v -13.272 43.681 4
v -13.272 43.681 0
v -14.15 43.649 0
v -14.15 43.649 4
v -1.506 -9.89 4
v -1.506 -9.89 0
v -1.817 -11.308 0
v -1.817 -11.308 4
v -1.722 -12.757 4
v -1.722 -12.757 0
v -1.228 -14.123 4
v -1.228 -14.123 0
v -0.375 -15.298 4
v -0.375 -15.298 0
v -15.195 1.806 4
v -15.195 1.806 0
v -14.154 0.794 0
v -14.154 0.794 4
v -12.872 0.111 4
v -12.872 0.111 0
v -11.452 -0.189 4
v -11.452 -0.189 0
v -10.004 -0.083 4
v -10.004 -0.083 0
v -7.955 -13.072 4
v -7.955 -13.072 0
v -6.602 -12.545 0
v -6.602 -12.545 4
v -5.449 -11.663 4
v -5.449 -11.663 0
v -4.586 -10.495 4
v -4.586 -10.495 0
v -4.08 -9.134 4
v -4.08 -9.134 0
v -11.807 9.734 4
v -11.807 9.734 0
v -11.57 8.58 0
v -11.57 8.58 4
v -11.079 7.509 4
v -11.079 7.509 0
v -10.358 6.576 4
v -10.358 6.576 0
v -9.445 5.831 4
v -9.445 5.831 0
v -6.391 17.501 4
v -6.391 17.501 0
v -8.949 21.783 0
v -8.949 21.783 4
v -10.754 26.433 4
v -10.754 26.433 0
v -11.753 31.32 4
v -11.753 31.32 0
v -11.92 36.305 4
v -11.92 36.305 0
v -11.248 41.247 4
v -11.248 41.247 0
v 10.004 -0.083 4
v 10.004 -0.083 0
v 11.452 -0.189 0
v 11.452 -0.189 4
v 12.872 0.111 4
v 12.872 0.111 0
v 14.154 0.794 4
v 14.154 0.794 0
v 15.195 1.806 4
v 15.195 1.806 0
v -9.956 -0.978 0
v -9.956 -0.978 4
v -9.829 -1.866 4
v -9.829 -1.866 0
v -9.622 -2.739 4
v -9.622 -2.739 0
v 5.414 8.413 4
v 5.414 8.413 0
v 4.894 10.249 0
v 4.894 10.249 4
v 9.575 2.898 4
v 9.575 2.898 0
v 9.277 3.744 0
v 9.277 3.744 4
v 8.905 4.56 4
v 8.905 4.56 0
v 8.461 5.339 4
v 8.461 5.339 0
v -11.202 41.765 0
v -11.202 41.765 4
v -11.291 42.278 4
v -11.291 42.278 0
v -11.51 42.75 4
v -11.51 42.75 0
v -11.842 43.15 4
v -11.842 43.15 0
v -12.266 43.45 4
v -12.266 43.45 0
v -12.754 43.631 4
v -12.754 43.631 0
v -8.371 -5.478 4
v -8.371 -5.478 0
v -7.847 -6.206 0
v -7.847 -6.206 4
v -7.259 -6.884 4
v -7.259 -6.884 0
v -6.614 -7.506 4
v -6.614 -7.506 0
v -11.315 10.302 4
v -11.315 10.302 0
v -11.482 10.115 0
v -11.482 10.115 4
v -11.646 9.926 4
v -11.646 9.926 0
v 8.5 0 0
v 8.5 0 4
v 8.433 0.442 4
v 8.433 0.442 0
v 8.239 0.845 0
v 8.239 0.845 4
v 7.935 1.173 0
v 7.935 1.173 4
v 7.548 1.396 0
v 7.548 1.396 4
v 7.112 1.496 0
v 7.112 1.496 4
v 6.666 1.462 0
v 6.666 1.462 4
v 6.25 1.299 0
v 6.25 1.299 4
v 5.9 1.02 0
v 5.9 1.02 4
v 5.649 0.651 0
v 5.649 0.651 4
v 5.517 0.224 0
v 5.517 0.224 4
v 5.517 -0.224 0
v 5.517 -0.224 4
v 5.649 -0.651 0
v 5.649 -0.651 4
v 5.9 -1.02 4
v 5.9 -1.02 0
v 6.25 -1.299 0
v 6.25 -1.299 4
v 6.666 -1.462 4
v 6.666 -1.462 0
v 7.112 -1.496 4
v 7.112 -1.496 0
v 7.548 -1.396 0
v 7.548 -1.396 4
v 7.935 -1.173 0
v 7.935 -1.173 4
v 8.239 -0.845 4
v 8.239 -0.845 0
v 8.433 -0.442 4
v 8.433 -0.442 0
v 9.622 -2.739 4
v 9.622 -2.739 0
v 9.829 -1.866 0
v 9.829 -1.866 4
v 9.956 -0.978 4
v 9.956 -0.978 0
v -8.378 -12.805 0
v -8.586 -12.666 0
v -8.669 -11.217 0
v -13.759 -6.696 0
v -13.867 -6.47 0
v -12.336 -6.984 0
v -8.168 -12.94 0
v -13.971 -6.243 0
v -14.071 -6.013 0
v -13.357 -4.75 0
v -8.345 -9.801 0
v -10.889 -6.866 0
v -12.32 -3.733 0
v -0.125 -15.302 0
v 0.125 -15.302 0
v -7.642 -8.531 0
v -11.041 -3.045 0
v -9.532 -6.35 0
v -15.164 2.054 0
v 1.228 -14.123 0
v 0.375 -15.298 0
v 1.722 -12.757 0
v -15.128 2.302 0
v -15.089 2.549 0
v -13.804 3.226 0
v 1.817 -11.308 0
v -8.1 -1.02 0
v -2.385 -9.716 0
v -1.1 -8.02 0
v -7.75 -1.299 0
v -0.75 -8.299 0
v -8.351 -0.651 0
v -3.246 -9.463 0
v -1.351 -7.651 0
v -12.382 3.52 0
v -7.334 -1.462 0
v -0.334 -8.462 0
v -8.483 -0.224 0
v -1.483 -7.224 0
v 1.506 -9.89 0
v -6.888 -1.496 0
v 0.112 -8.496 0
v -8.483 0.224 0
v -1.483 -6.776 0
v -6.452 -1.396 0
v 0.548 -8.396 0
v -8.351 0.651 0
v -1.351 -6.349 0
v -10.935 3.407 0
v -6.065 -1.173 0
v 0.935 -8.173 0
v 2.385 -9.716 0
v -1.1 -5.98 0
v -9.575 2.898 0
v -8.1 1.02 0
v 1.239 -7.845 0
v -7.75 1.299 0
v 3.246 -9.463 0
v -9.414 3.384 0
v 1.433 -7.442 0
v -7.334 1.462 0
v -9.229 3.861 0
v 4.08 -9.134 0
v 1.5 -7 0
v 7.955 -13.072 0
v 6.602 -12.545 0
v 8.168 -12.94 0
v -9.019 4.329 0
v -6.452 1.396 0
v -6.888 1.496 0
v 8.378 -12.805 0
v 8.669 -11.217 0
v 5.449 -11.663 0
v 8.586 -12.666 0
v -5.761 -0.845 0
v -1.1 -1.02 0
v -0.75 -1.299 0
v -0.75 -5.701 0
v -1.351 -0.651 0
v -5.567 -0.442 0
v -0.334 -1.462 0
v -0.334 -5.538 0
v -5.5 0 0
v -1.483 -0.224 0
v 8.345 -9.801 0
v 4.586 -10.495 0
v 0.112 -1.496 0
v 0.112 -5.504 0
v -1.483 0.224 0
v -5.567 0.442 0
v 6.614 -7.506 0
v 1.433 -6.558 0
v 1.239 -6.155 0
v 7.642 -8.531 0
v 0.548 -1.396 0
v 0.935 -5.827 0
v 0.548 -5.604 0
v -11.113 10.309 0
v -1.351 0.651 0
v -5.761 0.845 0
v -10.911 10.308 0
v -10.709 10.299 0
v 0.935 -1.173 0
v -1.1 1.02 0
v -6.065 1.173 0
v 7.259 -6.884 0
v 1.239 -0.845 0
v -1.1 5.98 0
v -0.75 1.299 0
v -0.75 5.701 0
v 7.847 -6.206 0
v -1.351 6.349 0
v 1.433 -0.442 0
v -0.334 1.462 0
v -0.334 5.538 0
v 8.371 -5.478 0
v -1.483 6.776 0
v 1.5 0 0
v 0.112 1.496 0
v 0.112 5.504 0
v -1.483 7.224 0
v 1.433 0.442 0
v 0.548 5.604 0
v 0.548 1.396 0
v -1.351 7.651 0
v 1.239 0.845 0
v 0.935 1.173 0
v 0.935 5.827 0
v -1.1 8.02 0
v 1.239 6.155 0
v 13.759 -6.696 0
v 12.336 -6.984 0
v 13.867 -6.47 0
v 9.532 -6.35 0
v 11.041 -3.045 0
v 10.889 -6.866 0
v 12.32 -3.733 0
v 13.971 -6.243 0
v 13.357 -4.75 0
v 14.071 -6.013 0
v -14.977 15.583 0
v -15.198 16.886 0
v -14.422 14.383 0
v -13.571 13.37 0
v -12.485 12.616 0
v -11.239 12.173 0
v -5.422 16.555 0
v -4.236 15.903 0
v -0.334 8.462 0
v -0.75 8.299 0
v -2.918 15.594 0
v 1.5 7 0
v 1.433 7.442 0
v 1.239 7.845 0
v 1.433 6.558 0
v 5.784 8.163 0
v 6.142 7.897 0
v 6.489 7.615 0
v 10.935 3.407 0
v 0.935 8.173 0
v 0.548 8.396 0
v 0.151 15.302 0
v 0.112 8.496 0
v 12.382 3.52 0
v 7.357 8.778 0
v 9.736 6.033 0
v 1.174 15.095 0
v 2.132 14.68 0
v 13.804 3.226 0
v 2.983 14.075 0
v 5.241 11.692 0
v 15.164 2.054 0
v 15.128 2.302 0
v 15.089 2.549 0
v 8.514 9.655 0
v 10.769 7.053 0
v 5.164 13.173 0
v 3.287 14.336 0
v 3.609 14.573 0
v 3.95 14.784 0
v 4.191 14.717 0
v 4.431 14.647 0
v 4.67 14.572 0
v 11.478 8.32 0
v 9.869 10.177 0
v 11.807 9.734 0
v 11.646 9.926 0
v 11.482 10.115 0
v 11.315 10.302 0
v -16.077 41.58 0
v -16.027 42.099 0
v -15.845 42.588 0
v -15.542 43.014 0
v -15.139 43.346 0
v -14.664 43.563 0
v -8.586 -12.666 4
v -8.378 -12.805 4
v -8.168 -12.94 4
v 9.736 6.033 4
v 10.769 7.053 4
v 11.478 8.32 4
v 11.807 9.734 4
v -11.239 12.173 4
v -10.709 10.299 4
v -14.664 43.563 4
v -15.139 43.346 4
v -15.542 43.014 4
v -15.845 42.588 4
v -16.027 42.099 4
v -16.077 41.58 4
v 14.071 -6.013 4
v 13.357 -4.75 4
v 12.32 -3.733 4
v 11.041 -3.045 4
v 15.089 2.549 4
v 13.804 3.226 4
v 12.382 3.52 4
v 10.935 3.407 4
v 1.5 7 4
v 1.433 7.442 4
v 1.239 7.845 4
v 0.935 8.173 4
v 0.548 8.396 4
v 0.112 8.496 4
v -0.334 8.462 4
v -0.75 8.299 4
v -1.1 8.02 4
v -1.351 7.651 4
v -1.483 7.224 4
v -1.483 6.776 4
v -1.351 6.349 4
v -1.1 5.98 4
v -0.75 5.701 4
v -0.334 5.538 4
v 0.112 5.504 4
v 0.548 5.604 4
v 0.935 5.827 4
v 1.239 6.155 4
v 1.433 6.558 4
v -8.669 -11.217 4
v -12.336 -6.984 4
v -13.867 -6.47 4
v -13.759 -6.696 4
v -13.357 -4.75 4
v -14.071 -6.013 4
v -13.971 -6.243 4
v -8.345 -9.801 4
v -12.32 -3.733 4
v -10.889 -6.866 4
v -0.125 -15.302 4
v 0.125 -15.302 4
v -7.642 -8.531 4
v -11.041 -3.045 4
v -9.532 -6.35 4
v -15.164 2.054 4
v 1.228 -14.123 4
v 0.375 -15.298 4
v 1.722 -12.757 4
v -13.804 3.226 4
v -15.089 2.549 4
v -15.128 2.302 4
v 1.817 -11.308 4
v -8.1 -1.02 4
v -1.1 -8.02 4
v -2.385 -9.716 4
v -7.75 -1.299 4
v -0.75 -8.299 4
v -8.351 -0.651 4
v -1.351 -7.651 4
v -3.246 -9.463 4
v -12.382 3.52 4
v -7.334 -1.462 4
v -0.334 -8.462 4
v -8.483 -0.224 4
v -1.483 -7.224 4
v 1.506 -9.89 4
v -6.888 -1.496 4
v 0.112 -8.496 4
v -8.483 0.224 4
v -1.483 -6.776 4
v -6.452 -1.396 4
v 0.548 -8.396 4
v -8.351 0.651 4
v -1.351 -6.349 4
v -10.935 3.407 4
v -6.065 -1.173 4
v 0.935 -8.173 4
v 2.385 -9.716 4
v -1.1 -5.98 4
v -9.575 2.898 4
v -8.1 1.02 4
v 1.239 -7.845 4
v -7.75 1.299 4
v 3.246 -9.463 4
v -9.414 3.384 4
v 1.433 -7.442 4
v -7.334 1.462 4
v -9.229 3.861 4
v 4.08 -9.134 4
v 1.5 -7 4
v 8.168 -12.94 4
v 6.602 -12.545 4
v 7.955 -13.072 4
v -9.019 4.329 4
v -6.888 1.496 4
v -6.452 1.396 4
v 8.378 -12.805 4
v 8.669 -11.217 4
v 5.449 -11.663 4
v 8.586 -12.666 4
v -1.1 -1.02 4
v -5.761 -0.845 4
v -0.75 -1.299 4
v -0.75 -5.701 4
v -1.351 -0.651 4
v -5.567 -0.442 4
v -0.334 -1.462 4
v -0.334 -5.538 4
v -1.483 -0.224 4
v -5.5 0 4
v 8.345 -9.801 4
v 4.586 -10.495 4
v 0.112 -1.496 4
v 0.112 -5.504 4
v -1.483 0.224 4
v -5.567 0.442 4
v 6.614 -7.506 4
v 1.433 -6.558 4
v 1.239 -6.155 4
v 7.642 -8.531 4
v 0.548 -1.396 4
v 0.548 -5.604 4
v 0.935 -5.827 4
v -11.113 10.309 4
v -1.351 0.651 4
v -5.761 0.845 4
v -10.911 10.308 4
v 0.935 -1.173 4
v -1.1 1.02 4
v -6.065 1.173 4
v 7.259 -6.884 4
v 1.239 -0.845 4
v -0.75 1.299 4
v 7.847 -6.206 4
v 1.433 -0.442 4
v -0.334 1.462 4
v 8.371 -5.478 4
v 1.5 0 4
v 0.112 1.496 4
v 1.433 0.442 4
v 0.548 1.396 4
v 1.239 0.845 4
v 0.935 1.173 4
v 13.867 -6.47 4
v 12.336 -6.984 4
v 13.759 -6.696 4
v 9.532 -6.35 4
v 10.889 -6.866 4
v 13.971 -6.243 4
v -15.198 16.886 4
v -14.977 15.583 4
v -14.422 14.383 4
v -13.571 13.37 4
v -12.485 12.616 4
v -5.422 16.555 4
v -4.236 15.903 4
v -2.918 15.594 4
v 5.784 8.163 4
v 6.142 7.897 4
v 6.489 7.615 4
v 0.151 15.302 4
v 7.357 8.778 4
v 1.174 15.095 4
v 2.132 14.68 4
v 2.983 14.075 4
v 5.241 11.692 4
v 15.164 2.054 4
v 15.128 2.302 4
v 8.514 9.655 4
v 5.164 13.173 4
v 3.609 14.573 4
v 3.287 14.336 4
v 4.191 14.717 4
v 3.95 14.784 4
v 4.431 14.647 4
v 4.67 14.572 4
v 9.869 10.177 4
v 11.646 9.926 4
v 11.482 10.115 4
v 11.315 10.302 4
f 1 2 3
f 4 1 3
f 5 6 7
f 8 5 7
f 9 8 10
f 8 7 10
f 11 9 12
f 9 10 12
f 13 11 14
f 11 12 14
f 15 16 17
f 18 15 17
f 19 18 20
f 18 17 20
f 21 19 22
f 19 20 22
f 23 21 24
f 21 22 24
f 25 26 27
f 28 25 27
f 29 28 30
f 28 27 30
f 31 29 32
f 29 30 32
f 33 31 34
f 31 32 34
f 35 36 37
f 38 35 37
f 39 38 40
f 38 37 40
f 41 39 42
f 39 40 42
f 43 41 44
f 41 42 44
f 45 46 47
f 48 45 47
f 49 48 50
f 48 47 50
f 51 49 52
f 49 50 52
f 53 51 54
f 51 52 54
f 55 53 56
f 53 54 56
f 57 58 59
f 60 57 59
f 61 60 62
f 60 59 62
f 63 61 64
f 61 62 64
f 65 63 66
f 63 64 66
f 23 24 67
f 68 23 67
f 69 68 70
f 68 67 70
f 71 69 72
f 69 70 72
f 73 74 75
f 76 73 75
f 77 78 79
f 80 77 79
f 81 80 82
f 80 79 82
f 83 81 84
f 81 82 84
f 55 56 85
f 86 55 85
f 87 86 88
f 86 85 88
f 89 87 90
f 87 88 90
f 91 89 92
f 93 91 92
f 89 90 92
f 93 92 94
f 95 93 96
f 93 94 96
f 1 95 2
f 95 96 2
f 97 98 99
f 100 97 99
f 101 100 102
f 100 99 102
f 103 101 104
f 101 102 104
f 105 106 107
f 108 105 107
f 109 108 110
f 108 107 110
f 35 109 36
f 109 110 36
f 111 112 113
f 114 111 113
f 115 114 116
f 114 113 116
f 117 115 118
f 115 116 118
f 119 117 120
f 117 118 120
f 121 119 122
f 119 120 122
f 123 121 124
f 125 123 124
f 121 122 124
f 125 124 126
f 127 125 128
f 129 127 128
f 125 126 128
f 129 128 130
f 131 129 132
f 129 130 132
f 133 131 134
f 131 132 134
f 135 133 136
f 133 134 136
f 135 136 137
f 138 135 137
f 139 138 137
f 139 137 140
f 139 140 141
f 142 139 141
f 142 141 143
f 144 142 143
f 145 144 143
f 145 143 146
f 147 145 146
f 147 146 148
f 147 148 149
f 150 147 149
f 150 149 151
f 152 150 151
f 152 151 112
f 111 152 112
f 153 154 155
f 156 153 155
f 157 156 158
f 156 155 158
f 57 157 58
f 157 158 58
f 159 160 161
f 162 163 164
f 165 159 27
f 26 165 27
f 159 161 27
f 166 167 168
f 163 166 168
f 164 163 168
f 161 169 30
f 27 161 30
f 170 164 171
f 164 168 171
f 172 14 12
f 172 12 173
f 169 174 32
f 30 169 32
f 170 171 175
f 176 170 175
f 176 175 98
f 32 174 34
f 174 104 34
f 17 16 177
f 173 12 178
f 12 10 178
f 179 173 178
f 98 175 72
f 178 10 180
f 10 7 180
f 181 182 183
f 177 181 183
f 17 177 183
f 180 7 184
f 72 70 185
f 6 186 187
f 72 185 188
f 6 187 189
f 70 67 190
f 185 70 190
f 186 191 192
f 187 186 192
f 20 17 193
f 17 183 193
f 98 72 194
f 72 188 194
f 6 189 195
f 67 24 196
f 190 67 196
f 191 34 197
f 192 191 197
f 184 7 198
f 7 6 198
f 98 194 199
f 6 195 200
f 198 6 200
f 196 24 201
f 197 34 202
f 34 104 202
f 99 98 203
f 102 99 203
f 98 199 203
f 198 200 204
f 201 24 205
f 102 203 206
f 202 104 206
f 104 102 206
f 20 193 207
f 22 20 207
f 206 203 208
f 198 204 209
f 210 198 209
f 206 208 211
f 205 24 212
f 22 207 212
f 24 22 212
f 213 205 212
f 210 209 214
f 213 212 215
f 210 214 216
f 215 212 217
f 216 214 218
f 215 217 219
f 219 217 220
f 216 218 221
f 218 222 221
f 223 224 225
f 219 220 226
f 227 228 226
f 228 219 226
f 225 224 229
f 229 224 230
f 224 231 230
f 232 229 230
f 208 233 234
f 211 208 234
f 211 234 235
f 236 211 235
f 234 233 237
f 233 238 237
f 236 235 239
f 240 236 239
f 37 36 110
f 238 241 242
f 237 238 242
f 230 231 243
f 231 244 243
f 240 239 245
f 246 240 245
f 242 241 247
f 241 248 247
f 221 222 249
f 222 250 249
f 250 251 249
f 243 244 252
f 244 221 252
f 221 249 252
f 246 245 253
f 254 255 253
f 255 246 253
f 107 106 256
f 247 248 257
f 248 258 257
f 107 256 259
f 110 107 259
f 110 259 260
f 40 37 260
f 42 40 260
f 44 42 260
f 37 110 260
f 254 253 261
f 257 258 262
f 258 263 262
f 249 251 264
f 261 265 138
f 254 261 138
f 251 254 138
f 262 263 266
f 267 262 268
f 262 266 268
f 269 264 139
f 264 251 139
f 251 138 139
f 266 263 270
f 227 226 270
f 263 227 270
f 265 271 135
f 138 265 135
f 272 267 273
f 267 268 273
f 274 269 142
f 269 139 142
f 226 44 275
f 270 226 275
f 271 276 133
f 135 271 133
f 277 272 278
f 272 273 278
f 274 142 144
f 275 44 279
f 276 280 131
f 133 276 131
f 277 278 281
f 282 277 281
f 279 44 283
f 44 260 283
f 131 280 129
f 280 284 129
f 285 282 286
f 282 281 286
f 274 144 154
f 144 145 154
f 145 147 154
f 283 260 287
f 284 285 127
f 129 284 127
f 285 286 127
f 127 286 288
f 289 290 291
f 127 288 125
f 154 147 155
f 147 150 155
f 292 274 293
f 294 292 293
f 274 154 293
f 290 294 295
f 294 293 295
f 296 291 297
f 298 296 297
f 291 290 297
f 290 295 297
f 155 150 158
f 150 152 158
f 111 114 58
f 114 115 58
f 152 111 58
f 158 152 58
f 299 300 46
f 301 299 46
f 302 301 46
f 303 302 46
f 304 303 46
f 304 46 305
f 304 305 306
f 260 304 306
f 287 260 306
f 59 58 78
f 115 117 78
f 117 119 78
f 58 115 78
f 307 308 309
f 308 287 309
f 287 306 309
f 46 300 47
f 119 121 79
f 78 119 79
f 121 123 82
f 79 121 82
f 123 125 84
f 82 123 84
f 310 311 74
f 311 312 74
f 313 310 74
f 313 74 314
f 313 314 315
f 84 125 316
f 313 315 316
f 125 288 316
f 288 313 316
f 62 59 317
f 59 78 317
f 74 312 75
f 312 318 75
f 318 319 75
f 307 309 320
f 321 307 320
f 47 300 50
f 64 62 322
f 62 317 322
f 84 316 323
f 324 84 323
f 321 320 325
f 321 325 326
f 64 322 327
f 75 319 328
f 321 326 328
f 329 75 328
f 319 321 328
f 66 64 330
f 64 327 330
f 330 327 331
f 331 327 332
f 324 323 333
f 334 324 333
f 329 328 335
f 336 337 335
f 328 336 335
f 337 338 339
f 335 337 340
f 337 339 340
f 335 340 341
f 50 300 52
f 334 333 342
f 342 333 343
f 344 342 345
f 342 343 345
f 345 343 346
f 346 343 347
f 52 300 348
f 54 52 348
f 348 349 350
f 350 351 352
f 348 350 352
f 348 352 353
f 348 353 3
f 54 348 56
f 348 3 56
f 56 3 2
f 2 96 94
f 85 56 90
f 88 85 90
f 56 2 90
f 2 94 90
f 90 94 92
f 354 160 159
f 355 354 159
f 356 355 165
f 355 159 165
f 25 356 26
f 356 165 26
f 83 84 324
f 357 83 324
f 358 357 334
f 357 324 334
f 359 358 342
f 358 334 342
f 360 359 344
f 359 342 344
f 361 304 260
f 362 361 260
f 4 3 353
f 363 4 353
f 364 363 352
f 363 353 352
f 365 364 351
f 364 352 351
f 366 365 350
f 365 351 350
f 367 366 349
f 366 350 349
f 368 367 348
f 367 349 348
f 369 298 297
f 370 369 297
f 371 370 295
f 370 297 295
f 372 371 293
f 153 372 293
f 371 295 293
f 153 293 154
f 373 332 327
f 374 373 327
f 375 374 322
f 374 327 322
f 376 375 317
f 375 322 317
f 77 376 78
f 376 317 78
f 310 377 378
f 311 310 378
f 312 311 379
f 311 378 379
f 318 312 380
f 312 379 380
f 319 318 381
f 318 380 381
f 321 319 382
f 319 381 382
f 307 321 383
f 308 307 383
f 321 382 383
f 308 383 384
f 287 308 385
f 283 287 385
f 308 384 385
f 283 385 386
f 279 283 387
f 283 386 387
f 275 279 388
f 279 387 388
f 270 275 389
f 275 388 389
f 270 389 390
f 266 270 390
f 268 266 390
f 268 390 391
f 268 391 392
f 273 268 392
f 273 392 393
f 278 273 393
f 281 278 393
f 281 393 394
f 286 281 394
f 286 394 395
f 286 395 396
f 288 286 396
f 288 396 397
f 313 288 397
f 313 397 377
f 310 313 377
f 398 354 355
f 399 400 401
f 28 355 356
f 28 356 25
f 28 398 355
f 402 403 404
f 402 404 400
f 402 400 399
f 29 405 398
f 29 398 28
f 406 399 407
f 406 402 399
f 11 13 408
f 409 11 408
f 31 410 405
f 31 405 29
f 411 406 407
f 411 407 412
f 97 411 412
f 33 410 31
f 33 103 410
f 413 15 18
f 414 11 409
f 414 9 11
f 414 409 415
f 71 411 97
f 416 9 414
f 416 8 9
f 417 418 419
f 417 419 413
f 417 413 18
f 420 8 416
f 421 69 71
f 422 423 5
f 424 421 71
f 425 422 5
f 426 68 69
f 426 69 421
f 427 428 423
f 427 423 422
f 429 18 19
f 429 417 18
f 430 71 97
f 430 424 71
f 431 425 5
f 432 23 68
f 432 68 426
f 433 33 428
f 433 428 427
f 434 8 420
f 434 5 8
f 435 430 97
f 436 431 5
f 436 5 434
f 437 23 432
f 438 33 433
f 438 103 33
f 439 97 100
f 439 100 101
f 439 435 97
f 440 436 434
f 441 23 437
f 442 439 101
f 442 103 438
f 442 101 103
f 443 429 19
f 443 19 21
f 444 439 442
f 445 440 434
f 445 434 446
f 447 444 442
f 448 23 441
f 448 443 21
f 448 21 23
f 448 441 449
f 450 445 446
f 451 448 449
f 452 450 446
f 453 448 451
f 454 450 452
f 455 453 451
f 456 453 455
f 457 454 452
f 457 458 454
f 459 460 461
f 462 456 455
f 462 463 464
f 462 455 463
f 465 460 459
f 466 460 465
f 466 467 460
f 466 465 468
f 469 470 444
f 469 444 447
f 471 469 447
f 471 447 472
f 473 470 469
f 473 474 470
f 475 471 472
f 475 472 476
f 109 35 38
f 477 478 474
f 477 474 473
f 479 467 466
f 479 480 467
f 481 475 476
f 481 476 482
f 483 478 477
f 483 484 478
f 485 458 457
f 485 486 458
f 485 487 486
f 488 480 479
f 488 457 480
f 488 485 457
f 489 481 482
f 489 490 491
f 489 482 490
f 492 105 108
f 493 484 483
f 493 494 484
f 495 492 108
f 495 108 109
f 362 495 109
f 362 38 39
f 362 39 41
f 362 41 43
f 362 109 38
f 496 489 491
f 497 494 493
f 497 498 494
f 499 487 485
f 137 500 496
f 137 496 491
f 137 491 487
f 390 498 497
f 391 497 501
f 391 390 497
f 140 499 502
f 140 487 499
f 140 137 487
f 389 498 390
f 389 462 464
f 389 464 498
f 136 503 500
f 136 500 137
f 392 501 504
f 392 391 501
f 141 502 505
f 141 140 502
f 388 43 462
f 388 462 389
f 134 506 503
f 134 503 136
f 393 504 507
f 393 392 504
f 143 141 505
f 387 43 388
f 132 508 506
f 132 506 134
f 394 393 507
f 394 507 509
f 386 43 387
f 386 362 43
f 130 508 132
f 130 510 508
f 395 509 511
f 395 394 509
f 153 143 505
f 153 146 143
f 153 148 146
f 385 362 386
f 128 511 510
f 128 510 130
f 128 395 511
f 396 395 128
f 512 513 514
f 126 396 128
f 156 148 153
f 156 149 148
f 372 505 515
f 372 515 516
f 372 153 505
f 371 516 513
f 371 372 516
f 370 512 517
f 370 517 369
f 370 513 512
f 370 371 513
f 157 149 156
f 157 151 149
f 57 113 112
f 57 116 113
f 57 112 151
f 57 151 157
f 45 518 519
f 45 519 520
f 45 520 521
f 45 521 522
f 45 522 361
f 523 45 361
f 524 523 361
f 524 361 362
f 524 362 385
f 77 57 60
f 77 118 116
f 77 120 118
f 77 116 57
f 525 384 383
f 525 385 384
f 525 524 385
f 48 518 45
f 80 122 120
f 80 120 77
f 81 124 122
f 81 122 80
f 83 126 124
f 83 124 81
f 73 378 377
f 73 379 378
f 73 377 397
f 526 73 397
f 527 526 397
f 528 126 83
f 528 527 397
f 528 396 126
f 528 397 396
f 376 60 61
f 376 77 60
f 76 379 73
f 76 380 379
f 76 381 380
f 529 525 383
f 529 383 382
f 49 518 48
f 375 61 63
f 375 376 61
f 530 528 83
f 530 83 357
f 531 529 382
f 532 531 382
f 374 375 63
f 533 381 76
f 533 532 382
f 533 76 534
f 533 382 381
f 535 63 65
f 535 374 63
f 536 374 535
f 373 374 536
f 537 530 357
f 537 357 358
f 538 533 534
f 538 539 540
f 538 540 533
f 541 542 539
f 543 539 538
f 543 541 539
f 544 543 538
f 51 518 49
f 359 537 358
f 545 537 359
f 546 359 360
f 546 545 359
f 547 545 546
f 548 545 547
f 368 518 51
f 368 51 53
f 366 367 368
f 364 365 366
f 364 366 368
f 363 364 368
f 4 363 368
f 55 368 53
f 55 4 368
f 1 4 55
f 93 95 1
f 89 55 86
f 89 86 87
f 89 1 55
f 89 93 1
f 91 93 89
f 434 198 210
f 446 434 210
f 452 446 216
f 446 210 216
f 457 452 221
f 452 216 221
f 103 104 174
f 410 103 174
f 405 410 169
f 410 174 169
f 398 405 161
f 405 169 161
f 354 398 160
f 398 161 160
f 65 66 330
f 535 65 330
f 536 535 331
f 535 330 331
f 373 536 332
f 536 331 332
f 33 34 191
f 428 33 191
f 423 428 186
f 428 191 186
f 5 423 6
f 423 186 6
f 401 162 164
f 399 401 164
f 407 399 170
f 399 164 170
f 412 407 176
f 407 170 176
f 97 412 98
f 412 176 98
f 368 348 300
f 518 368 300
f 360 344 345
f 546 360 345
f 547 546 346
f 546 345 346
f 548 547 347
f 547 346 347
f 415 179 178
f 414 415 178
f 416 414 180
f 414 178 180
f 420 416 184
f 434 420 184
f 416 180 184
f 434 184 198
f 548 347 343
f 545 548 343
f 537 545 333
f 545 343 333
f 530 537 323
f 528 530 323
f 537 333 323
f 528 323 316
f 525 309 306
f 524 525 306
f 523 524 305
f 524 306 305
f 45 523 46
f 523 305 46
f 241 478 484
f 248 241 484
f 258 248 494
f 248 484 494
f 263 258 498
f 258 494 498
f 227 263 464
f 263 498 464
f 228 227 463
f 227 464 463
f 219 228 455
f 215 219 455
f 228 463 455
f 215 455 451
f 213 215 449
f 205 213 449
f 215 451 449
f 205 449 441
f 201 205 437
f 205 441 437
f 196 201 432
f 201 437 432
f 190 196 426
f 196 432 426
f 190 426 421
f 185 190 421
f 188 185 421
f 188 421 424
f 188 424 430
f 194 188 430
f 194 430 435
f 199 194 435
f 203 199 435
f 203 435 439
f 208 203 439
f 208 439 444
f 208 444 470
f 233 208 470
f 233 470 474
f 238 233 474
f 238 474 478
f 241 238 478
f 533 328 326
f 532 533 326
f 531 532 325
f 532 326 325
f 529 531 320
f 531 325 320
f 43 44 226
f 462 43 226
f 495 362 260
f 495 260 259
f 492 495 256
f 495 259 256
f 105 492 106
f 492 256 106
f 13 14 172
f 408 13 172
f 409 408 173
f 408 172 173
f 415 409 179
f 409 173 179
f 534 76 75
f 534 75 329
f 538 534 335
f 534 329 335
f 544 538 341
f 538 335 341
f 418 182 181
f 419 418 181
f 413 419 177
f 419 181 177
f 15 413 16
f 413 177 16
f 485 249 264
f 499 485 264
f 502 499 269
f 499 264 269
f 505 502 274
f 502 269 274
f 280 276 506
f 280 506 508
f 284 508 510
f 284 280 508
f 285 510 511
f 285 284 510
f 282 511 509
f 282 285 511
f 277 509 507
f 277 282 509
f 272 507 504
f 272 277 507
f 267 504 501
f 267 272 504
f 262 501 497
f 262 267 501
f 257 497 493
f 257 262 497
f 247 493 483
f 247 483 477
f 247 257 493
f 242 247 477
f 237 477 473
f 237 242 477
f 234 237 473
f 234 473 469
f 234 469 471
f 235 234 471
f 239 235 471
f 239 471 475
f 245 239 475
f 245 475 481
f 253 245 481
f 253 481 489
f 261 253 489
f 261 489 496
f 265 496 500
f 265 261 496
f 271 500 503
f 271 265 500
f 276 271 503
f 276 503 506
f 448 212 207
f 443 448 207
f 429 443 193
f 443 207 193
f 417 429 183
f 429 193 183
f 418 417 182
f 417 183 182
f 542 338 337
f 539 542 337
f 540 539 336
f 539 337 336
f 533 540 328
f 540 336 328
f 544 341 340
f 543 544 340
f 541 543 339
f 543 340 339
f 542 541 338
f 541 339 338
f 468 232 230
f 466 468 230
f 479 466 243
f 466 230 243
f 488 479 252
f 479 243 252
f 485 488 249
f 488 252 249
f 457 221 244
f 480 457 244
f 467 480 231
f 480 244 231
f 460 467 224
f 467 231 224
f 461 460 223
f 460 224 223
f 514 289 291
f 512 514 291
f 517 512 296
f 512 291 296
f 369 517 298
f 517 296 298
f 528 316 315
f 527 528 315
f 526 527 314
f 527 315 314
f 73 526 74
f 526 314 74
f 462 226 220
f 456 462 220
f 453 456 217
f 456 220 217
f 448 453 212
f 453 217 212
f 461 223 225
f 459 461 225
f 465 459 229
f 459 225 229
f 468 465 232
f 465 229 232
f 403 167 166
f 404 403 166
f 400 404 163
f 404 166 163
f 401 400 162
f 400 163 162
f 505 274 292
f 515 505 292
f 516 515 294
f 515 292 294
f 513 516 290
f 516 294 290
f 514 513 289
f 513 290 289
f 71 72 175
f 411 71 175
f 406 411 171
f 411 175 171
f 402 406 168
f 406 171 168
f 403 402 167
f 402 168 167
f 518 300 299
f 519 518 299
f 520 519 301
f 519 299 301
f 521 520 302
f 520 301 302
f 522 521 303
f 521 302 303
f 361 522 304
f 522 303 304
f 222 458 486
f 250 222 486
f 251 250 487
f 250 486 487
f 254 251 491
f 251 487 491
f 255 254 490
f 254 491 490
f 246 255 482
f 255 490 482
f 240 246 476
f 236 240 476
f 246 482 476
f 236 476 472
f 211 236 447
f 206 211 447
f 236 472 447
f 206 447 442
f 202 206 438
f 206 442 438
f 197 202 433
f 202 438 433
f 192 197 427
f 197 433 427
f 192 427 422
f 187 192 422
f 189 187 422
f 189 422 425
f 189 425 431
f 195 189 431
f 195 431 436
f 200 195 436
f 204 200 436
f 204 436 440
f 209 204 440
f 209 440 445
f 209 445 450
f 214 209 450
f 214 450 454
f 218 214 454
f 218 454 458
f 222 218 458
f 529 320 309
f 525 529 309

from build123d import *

# Parameters (mm, degrees)
SKETCH_1_R          = 1.5
EXTRUDE_1_DEPTH     = 4
EXTRUDE_START       = -4
SKETCH_2_R          = 1.5
EXTRUDE_2_DEPTH     = 4
SKETCH_3_R          = 1.5
CUT_EXTRUDE_1_DEPTH = 10


with BuildPart() as part:
    # Эскиз1 → Бобышка-Вытянуть1 (new body)
    with BuildSketch(Plane.XY):
        with BuildLine():
            ThreePointArc((14.071260881, -6.013492872), (12.319653053, -3.733490841), (9.621977893, -2.738961818))
            ThreePointArc((9.621977893, -2.738961818), (9.902389121, -1.423748614), (10.003874897, -0.082809815))
            ThreePointArc((10.003874897, -0.082809815), (12.872466462, 0.111410875), (15.195472667, 1.805571852))
            ThreePointArc((15.195472667, 1.805571852), (15.146612375, 2.177754087), (15.088637629, 2.548625862))
            ThreePointArc((15.088637629, 2.548625862), (12.382429194, 3.519694937), (9.575317452, 2.897872688))
            ThreePointArc((9.575317452, 2.897872688), (9.100156446, 4.155902197), (8.460565465, 5.338839053))
            ThreePointArc((8.460565465, 5.338839053), (10.768774621, 7.053105583), (11.807079223, 9.734236463))
            ThreePointArc((11.807079223, 9.734236463), (11.564758421, 10.020920215), (11.315478542, 10.301573893))
            ThreePointArc((11.315478542, 10.301573893), (8.513871556, 9.655402442), (6.488561375, 7.614653091))
            ThreePointArc((6.488561375, 7.614653091), (5.408688398, 8.416083426), (4.231086277, 9.065444244))
            ThreePointArc((4.231086277, 9.065444244), (5.246072926, 11.755489103), (4.67002155, 14.572349777))
            ThreePointArc((4.67002155, 14.572349777), (4.311175381, 14.68251498), (3.949734969, 14.783845))
            ThreePointArc((3.949734969, 14.783845), (1.942219856, 12.725587893), (1.341732908, 9.91383494))
            ThreePointArc((1.341732908, 9.91383494), (0, 10.004217632), (-1.341732908, 9.91383494))
            ThreePointArc((-1.341732908, 9.91383494), (-1.942219856, 12.725587893), (-3.949734969, 14.783845))
            ThreePointArc((-3.949734969, 14.783845), (-4.311175381, 14.68251498), (-4.67002155, 14.572349777))
            ThreePointArc((-4.67002155, 14.572349777), (-5.246072926, 11.755489103), (-4.231086277, 9.065444244))
            ThreePointArc((-4.231086277, 9.065444244), (-5.408688398, 8.416083426), (-6.488561375, 7.614653091))
            ThreePointArc((-6.488561375, 7.614653091), (-8.513871556, 9.655402442), (-11.315478542, 10.301573893))
            ThreePointArc((-11.315478542, 10.301573893), (-11.564758421, 10.020920215), (-11.807079223, 9.734236463))
            ThreePointArc((-11.807079223, 9.734236463), (-10.768774621, 7.053105583), (-8.460565465, 5.338839053))
            ThreePointArc((-8.460565465, 5.338839053), (-9.100156446, 4.155902197), (-9.575317452, 2.897872688))
            ThreePointArc((-9.575317452, 2.897872688), (-12.382429194, 3.519694937), (-15.088637629, 2.548625862))
            ThreePointArc((-15.088637629, 2.548625862), (-15.146612375, 2.177754087), (-15.195472667, 1.805571852))
            ThreePointArc((-15.195472667, 1.805571852), (-12.872466462, 0.111410875), (-10.003874897, -0.082809815))
            ThreePointArc((-10.003874897, -0.082809815), (-9.902389121, -1.423748614), (-9.621977893, -2.738961818))
            ThreePointArc((-9.621977893, -2.738961818), (-12.319653053, -3.733490841), (-14.071260881, -6.013492872))
            ThreePointArc((-14.071260881, -6.013492872), (-13.91952392, -6.356833577), (-13.759410906, -6.696349066))
            ThreePointArc((-13.759410906, -6.696349066), (-10.889241154, -6.865655999), (-8.371024733, -5.478167151))
            ThreePointArc((-8.371024733, -5.478167151), (-7.560683217, -6.551369301), (-6.613728339, -7.506195299))
            ThreePointArc((-6.613728339, -7.506195299), (-8.345474114, -9.801319657), (-8.586358225, -12.666370108))
            ThreePointArc((-8.586358225, -12.666370108), (-8.273084972, -12.873171495), (-7.954833402, -13.072226469))
            ThreePointArc((-7.954833402, -13.072226469), (-5.448758719, -11.662925603), (-4.080433364, -9.134245124))
            ThreePointArc((-4.080433364, -9.134245124), (-2.818513813, -9.598976524), (-1.505666768, -9.89026481))
            ThreePointArc((-1.505666768, -9.89026481), (-1.72166611, -12.757298735), (-0.375347502, -15.297764332))
            ThreePointArc((-0.375347502, -15.297764332), (0, -15.302368421), (0.375347502, -15.297764332))
            ThreePointArc((0.375347502, -15.297764332), (1.72166611, -12.757298735), (1.505666768, -9.89026481))
            ThreePointArc((1.505666768, -9.89026481), (2.818513813, -9.598976524), (4.080433364, -9.134245124))
            ThreePointArc((4.080433364, -9.134245124), (5.448758719, -11.662925603), (7.954833402, -13.072226469))
            ThreePointArc((7.954833402, -13.072226469), (8.273084972, -12.873171495), (8.586358225, -12.666370108))
            ThreePointArc((8.586358225, -12.666370108), (8.345474114, -9.801319657), (6.613728339, -7.506195299))
            ThreePointArc((6.613728339, -7.506195299), (7.560683217, -6.551369301), (8.371024733, -5.478167151))
            ThreePointArc((8.371024733, -5.478167151), (10.889241154, -6.865655999), (13.759410906, -6.696349066))
            ThreePointArc((13.759410906, -6.696349066), (13.91952392, -6.356833577), (14.071260881, -6.013492872))
        make_face()
        Circle(SKETCH_1_R, mode=Mode.SUBTRACT)
    extrude(amount=EXTRUDE_1_DEPTH)

    # Эскиз2 → Бобышка-Вытянуть2 (add)
    with BuildSketch(Plane.XY.offset(4).offset(EXTRUDE_START)):
        with BuildLine():
            Line((-13.27175932, 43.680693777), (-14.149597226, 43.649446698))
            ThreePointArc((-14.149597226, 43.649446698), (-15.542077543, 43.013723237), (-16.077185448, 41.579566593))
            Line((-16.077185448, 41.579566593), (-15.198219126, 16.886379902))
            ThreePointArc((-15.198219126, 16.886379902), (-14.029929813, 13.848310241), (-11.239138319, 12.173123678))
            Line((-11.239138319, 12.173123678), (-7.216634951, -2.042101853))
            ThreePointArc((-7.216634951, -2.042101853), (2.042101853, -7.216634951), (7.216634951, 2.042101853))
            Line((7.216634951, 2.042101853), (4.487820228, 11.685528641))
            ThreePointArc((4.487820228, 11.685528641), (2.878536468, 14.16449679), (0.150531719, 15.301628001))
            Line((0.150531719, 15.301628001), (-2.91779922, 15.593698218))
            ThreePointArc((-2.91779922, 15.593698218), (-4.851213091, 16.18881198), (-6.390589925, 17.501278571))
            ThreePointArc((-6.390589925, 17.501278571), (-11.35627908, 28.85521173), (-11.248467313, 41.247073721))
            ThreePointArc((-11.248467313, 41.247073721), (-11.662703429, 42.960565491), (-13.27175932, 43.680693777))
        make_face()
        Circle(SKETCH_2_R, mode=Mode.SUBTRACT)
    extrude(amount=EXTRUDE_2_DEPTH)

    # Эскиз3 → Вырез-Вытянуть1 (cut)
    with BuildSketch(Plane.XY.offset(4)):
        with Locations((0, 7)):
            Circle(SKETCH_3_R)
        with Locations((7, 0)):
            Circle(SKETCH_3_R)
        with Locations((0, -7)):
            Circle(SKETCH_3_R)
        with Locations((-7, 0)):
            Circle(SKETCH_3_R)
    extrude(amount=-CUT_EXTRUDE_1_DEPTH, mode=Mode.SUBTRACT)


solid = part.part
